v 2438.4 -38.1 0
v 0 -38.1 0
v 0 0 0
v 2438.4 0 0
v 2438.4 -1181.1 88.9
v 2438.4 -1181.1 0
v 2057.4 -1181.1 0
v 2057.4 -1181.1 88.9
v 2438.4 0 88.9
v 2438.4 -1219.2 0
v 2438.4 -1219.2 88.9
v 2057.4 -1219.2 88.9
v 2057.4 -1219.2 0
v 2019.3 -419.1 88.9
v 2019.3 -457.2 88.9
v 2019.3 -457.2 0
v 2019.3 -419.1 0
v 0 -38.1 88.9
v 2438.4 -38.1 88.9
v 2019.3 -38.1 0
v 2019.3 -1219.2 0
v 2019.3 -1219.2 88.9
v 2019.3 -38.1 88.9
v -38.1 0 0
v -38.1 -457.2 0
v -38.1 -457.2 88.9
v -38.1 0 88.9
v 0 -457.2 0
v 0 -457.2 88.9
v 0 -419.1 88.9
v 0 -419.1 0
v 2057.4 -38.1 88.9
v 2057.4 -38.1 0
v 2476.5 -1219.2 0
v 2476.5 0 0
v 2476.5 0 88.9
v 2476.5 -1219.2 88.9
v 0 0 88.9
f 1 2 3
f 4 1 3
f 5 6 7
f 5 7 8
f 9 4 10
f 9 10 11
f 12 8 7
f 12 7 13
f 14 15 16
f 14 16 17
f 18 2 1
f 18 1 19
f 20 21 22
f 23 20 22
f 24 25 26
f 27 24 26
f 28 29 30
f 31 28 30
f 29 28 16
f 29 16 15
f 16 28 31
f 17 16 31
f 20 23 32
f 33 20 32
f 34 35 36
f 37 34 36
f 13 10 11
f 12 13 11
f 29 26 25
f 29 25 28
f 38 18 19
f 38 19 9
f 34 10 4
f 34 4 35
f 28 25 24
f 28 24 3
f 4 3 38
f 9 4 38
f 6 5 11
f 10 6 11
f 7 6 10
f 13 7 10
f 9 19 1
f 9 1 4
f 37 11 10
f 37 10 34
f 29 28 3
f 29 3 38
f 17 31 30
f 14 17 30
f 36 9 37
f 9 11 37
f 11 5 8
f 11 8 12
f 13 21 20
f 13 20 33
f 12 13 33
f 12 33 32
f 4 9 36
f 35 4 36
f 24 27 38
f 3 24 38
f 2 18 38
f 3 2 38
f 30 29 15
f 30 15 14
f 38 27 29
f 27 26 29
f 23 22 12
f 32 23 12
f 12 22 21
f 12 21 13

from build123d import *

# Parameters (mm, degrees)
F0_W          = 38.1
F0_H          = 88.9
F1_DEPTH      = 2438.4
F2_W          = 38.1
F2_H          = 88.9
F3_DEPTH      = 419.1
F3_DEPTH_BACK = 38.1
F4_W          = 38.1
F4_H          = 88.9
F5_DEPTH      = 2019.3
F6_W          = 38.1
F6_H          = 88.9
F7_DEPTH      = 1181.1
F7_DEPTH_BACK = 38.1
F8_W          = 38.1
F8_H          = 88.9
F9_DEPTH      = 381
F10_W         = 38.1
F10_H         = 88.9
F11_DEPTH     = 1181.1


with BuildPart() as f1:
    # F0 (on Right) → F1 (new body)
    with BuildSketch(Plane.YZ):
        with Locations((-19.05, 44.45)):
            Rectangle(F0_W, F0_H)
    extrude(amount=F1_DEPTH)


with BuildPart() as f3:
    # F2 (on face) → F3 (new body, two sides)
    with BuildSketch(Plane.XZ.offset(38.1)) as f3_sk:
        with Locations((-19.05, 44.45)):
            Rectangle(F2_W, F2_H)
    extrude(amount=F3_DEPTH)
    extrude(f3_sk.sketch, amount=-F3_DEPTH_BACK)


with BuildPart() as f5:
    # F4 (on Right) → F5 (new body)
    with BuildSketch(Plane.YZ):
        with Locations((-438.15, 44.45)):
            Rectangle(F4_W, F4_H)
    extrude(amount=F5_DEPTH)


with BuildPart() as f7:
    # F6 (on face) → F7 (new body, two sides)
    with BuildSketch(Plane.XZ.offset(38.1)) as f7_sk:
        with Locations((2457.45, 44.45)):
            Rectangle(F6_W, F6_H)
    extrude(amount=F7_DEPTH)
    extrude(f7_sk.sketch, amount=-F7_DEPTH_BACK)


with BuildPart() as f9:
    # F8 (on face) → F9 (new body)
    with BuildSketch(Plane(origin=(2438.4, 0, 0), x_dir=(0, -1, 0), z_dir=(-1, 0, 0))):
        with Locations((1200.15, 44.45)):
            Rectangle(F8_W, F8_H)
    extrude(amount=F9_DEPTH)


with BuildPart() as f11:
    # F10 (on face) → F11 (new body, through all)
    with BuildSketch(Plane.XZ.offset(1219.2)):
        with Locations((2038.35, 44.45)):
            Rectangle(F10_W, F10_H)
    extrude(amount=-F11_DEPTH)


solid = Compound([f1.part, f3.part, f5.part, f7.part, f9.part, f11.part])
